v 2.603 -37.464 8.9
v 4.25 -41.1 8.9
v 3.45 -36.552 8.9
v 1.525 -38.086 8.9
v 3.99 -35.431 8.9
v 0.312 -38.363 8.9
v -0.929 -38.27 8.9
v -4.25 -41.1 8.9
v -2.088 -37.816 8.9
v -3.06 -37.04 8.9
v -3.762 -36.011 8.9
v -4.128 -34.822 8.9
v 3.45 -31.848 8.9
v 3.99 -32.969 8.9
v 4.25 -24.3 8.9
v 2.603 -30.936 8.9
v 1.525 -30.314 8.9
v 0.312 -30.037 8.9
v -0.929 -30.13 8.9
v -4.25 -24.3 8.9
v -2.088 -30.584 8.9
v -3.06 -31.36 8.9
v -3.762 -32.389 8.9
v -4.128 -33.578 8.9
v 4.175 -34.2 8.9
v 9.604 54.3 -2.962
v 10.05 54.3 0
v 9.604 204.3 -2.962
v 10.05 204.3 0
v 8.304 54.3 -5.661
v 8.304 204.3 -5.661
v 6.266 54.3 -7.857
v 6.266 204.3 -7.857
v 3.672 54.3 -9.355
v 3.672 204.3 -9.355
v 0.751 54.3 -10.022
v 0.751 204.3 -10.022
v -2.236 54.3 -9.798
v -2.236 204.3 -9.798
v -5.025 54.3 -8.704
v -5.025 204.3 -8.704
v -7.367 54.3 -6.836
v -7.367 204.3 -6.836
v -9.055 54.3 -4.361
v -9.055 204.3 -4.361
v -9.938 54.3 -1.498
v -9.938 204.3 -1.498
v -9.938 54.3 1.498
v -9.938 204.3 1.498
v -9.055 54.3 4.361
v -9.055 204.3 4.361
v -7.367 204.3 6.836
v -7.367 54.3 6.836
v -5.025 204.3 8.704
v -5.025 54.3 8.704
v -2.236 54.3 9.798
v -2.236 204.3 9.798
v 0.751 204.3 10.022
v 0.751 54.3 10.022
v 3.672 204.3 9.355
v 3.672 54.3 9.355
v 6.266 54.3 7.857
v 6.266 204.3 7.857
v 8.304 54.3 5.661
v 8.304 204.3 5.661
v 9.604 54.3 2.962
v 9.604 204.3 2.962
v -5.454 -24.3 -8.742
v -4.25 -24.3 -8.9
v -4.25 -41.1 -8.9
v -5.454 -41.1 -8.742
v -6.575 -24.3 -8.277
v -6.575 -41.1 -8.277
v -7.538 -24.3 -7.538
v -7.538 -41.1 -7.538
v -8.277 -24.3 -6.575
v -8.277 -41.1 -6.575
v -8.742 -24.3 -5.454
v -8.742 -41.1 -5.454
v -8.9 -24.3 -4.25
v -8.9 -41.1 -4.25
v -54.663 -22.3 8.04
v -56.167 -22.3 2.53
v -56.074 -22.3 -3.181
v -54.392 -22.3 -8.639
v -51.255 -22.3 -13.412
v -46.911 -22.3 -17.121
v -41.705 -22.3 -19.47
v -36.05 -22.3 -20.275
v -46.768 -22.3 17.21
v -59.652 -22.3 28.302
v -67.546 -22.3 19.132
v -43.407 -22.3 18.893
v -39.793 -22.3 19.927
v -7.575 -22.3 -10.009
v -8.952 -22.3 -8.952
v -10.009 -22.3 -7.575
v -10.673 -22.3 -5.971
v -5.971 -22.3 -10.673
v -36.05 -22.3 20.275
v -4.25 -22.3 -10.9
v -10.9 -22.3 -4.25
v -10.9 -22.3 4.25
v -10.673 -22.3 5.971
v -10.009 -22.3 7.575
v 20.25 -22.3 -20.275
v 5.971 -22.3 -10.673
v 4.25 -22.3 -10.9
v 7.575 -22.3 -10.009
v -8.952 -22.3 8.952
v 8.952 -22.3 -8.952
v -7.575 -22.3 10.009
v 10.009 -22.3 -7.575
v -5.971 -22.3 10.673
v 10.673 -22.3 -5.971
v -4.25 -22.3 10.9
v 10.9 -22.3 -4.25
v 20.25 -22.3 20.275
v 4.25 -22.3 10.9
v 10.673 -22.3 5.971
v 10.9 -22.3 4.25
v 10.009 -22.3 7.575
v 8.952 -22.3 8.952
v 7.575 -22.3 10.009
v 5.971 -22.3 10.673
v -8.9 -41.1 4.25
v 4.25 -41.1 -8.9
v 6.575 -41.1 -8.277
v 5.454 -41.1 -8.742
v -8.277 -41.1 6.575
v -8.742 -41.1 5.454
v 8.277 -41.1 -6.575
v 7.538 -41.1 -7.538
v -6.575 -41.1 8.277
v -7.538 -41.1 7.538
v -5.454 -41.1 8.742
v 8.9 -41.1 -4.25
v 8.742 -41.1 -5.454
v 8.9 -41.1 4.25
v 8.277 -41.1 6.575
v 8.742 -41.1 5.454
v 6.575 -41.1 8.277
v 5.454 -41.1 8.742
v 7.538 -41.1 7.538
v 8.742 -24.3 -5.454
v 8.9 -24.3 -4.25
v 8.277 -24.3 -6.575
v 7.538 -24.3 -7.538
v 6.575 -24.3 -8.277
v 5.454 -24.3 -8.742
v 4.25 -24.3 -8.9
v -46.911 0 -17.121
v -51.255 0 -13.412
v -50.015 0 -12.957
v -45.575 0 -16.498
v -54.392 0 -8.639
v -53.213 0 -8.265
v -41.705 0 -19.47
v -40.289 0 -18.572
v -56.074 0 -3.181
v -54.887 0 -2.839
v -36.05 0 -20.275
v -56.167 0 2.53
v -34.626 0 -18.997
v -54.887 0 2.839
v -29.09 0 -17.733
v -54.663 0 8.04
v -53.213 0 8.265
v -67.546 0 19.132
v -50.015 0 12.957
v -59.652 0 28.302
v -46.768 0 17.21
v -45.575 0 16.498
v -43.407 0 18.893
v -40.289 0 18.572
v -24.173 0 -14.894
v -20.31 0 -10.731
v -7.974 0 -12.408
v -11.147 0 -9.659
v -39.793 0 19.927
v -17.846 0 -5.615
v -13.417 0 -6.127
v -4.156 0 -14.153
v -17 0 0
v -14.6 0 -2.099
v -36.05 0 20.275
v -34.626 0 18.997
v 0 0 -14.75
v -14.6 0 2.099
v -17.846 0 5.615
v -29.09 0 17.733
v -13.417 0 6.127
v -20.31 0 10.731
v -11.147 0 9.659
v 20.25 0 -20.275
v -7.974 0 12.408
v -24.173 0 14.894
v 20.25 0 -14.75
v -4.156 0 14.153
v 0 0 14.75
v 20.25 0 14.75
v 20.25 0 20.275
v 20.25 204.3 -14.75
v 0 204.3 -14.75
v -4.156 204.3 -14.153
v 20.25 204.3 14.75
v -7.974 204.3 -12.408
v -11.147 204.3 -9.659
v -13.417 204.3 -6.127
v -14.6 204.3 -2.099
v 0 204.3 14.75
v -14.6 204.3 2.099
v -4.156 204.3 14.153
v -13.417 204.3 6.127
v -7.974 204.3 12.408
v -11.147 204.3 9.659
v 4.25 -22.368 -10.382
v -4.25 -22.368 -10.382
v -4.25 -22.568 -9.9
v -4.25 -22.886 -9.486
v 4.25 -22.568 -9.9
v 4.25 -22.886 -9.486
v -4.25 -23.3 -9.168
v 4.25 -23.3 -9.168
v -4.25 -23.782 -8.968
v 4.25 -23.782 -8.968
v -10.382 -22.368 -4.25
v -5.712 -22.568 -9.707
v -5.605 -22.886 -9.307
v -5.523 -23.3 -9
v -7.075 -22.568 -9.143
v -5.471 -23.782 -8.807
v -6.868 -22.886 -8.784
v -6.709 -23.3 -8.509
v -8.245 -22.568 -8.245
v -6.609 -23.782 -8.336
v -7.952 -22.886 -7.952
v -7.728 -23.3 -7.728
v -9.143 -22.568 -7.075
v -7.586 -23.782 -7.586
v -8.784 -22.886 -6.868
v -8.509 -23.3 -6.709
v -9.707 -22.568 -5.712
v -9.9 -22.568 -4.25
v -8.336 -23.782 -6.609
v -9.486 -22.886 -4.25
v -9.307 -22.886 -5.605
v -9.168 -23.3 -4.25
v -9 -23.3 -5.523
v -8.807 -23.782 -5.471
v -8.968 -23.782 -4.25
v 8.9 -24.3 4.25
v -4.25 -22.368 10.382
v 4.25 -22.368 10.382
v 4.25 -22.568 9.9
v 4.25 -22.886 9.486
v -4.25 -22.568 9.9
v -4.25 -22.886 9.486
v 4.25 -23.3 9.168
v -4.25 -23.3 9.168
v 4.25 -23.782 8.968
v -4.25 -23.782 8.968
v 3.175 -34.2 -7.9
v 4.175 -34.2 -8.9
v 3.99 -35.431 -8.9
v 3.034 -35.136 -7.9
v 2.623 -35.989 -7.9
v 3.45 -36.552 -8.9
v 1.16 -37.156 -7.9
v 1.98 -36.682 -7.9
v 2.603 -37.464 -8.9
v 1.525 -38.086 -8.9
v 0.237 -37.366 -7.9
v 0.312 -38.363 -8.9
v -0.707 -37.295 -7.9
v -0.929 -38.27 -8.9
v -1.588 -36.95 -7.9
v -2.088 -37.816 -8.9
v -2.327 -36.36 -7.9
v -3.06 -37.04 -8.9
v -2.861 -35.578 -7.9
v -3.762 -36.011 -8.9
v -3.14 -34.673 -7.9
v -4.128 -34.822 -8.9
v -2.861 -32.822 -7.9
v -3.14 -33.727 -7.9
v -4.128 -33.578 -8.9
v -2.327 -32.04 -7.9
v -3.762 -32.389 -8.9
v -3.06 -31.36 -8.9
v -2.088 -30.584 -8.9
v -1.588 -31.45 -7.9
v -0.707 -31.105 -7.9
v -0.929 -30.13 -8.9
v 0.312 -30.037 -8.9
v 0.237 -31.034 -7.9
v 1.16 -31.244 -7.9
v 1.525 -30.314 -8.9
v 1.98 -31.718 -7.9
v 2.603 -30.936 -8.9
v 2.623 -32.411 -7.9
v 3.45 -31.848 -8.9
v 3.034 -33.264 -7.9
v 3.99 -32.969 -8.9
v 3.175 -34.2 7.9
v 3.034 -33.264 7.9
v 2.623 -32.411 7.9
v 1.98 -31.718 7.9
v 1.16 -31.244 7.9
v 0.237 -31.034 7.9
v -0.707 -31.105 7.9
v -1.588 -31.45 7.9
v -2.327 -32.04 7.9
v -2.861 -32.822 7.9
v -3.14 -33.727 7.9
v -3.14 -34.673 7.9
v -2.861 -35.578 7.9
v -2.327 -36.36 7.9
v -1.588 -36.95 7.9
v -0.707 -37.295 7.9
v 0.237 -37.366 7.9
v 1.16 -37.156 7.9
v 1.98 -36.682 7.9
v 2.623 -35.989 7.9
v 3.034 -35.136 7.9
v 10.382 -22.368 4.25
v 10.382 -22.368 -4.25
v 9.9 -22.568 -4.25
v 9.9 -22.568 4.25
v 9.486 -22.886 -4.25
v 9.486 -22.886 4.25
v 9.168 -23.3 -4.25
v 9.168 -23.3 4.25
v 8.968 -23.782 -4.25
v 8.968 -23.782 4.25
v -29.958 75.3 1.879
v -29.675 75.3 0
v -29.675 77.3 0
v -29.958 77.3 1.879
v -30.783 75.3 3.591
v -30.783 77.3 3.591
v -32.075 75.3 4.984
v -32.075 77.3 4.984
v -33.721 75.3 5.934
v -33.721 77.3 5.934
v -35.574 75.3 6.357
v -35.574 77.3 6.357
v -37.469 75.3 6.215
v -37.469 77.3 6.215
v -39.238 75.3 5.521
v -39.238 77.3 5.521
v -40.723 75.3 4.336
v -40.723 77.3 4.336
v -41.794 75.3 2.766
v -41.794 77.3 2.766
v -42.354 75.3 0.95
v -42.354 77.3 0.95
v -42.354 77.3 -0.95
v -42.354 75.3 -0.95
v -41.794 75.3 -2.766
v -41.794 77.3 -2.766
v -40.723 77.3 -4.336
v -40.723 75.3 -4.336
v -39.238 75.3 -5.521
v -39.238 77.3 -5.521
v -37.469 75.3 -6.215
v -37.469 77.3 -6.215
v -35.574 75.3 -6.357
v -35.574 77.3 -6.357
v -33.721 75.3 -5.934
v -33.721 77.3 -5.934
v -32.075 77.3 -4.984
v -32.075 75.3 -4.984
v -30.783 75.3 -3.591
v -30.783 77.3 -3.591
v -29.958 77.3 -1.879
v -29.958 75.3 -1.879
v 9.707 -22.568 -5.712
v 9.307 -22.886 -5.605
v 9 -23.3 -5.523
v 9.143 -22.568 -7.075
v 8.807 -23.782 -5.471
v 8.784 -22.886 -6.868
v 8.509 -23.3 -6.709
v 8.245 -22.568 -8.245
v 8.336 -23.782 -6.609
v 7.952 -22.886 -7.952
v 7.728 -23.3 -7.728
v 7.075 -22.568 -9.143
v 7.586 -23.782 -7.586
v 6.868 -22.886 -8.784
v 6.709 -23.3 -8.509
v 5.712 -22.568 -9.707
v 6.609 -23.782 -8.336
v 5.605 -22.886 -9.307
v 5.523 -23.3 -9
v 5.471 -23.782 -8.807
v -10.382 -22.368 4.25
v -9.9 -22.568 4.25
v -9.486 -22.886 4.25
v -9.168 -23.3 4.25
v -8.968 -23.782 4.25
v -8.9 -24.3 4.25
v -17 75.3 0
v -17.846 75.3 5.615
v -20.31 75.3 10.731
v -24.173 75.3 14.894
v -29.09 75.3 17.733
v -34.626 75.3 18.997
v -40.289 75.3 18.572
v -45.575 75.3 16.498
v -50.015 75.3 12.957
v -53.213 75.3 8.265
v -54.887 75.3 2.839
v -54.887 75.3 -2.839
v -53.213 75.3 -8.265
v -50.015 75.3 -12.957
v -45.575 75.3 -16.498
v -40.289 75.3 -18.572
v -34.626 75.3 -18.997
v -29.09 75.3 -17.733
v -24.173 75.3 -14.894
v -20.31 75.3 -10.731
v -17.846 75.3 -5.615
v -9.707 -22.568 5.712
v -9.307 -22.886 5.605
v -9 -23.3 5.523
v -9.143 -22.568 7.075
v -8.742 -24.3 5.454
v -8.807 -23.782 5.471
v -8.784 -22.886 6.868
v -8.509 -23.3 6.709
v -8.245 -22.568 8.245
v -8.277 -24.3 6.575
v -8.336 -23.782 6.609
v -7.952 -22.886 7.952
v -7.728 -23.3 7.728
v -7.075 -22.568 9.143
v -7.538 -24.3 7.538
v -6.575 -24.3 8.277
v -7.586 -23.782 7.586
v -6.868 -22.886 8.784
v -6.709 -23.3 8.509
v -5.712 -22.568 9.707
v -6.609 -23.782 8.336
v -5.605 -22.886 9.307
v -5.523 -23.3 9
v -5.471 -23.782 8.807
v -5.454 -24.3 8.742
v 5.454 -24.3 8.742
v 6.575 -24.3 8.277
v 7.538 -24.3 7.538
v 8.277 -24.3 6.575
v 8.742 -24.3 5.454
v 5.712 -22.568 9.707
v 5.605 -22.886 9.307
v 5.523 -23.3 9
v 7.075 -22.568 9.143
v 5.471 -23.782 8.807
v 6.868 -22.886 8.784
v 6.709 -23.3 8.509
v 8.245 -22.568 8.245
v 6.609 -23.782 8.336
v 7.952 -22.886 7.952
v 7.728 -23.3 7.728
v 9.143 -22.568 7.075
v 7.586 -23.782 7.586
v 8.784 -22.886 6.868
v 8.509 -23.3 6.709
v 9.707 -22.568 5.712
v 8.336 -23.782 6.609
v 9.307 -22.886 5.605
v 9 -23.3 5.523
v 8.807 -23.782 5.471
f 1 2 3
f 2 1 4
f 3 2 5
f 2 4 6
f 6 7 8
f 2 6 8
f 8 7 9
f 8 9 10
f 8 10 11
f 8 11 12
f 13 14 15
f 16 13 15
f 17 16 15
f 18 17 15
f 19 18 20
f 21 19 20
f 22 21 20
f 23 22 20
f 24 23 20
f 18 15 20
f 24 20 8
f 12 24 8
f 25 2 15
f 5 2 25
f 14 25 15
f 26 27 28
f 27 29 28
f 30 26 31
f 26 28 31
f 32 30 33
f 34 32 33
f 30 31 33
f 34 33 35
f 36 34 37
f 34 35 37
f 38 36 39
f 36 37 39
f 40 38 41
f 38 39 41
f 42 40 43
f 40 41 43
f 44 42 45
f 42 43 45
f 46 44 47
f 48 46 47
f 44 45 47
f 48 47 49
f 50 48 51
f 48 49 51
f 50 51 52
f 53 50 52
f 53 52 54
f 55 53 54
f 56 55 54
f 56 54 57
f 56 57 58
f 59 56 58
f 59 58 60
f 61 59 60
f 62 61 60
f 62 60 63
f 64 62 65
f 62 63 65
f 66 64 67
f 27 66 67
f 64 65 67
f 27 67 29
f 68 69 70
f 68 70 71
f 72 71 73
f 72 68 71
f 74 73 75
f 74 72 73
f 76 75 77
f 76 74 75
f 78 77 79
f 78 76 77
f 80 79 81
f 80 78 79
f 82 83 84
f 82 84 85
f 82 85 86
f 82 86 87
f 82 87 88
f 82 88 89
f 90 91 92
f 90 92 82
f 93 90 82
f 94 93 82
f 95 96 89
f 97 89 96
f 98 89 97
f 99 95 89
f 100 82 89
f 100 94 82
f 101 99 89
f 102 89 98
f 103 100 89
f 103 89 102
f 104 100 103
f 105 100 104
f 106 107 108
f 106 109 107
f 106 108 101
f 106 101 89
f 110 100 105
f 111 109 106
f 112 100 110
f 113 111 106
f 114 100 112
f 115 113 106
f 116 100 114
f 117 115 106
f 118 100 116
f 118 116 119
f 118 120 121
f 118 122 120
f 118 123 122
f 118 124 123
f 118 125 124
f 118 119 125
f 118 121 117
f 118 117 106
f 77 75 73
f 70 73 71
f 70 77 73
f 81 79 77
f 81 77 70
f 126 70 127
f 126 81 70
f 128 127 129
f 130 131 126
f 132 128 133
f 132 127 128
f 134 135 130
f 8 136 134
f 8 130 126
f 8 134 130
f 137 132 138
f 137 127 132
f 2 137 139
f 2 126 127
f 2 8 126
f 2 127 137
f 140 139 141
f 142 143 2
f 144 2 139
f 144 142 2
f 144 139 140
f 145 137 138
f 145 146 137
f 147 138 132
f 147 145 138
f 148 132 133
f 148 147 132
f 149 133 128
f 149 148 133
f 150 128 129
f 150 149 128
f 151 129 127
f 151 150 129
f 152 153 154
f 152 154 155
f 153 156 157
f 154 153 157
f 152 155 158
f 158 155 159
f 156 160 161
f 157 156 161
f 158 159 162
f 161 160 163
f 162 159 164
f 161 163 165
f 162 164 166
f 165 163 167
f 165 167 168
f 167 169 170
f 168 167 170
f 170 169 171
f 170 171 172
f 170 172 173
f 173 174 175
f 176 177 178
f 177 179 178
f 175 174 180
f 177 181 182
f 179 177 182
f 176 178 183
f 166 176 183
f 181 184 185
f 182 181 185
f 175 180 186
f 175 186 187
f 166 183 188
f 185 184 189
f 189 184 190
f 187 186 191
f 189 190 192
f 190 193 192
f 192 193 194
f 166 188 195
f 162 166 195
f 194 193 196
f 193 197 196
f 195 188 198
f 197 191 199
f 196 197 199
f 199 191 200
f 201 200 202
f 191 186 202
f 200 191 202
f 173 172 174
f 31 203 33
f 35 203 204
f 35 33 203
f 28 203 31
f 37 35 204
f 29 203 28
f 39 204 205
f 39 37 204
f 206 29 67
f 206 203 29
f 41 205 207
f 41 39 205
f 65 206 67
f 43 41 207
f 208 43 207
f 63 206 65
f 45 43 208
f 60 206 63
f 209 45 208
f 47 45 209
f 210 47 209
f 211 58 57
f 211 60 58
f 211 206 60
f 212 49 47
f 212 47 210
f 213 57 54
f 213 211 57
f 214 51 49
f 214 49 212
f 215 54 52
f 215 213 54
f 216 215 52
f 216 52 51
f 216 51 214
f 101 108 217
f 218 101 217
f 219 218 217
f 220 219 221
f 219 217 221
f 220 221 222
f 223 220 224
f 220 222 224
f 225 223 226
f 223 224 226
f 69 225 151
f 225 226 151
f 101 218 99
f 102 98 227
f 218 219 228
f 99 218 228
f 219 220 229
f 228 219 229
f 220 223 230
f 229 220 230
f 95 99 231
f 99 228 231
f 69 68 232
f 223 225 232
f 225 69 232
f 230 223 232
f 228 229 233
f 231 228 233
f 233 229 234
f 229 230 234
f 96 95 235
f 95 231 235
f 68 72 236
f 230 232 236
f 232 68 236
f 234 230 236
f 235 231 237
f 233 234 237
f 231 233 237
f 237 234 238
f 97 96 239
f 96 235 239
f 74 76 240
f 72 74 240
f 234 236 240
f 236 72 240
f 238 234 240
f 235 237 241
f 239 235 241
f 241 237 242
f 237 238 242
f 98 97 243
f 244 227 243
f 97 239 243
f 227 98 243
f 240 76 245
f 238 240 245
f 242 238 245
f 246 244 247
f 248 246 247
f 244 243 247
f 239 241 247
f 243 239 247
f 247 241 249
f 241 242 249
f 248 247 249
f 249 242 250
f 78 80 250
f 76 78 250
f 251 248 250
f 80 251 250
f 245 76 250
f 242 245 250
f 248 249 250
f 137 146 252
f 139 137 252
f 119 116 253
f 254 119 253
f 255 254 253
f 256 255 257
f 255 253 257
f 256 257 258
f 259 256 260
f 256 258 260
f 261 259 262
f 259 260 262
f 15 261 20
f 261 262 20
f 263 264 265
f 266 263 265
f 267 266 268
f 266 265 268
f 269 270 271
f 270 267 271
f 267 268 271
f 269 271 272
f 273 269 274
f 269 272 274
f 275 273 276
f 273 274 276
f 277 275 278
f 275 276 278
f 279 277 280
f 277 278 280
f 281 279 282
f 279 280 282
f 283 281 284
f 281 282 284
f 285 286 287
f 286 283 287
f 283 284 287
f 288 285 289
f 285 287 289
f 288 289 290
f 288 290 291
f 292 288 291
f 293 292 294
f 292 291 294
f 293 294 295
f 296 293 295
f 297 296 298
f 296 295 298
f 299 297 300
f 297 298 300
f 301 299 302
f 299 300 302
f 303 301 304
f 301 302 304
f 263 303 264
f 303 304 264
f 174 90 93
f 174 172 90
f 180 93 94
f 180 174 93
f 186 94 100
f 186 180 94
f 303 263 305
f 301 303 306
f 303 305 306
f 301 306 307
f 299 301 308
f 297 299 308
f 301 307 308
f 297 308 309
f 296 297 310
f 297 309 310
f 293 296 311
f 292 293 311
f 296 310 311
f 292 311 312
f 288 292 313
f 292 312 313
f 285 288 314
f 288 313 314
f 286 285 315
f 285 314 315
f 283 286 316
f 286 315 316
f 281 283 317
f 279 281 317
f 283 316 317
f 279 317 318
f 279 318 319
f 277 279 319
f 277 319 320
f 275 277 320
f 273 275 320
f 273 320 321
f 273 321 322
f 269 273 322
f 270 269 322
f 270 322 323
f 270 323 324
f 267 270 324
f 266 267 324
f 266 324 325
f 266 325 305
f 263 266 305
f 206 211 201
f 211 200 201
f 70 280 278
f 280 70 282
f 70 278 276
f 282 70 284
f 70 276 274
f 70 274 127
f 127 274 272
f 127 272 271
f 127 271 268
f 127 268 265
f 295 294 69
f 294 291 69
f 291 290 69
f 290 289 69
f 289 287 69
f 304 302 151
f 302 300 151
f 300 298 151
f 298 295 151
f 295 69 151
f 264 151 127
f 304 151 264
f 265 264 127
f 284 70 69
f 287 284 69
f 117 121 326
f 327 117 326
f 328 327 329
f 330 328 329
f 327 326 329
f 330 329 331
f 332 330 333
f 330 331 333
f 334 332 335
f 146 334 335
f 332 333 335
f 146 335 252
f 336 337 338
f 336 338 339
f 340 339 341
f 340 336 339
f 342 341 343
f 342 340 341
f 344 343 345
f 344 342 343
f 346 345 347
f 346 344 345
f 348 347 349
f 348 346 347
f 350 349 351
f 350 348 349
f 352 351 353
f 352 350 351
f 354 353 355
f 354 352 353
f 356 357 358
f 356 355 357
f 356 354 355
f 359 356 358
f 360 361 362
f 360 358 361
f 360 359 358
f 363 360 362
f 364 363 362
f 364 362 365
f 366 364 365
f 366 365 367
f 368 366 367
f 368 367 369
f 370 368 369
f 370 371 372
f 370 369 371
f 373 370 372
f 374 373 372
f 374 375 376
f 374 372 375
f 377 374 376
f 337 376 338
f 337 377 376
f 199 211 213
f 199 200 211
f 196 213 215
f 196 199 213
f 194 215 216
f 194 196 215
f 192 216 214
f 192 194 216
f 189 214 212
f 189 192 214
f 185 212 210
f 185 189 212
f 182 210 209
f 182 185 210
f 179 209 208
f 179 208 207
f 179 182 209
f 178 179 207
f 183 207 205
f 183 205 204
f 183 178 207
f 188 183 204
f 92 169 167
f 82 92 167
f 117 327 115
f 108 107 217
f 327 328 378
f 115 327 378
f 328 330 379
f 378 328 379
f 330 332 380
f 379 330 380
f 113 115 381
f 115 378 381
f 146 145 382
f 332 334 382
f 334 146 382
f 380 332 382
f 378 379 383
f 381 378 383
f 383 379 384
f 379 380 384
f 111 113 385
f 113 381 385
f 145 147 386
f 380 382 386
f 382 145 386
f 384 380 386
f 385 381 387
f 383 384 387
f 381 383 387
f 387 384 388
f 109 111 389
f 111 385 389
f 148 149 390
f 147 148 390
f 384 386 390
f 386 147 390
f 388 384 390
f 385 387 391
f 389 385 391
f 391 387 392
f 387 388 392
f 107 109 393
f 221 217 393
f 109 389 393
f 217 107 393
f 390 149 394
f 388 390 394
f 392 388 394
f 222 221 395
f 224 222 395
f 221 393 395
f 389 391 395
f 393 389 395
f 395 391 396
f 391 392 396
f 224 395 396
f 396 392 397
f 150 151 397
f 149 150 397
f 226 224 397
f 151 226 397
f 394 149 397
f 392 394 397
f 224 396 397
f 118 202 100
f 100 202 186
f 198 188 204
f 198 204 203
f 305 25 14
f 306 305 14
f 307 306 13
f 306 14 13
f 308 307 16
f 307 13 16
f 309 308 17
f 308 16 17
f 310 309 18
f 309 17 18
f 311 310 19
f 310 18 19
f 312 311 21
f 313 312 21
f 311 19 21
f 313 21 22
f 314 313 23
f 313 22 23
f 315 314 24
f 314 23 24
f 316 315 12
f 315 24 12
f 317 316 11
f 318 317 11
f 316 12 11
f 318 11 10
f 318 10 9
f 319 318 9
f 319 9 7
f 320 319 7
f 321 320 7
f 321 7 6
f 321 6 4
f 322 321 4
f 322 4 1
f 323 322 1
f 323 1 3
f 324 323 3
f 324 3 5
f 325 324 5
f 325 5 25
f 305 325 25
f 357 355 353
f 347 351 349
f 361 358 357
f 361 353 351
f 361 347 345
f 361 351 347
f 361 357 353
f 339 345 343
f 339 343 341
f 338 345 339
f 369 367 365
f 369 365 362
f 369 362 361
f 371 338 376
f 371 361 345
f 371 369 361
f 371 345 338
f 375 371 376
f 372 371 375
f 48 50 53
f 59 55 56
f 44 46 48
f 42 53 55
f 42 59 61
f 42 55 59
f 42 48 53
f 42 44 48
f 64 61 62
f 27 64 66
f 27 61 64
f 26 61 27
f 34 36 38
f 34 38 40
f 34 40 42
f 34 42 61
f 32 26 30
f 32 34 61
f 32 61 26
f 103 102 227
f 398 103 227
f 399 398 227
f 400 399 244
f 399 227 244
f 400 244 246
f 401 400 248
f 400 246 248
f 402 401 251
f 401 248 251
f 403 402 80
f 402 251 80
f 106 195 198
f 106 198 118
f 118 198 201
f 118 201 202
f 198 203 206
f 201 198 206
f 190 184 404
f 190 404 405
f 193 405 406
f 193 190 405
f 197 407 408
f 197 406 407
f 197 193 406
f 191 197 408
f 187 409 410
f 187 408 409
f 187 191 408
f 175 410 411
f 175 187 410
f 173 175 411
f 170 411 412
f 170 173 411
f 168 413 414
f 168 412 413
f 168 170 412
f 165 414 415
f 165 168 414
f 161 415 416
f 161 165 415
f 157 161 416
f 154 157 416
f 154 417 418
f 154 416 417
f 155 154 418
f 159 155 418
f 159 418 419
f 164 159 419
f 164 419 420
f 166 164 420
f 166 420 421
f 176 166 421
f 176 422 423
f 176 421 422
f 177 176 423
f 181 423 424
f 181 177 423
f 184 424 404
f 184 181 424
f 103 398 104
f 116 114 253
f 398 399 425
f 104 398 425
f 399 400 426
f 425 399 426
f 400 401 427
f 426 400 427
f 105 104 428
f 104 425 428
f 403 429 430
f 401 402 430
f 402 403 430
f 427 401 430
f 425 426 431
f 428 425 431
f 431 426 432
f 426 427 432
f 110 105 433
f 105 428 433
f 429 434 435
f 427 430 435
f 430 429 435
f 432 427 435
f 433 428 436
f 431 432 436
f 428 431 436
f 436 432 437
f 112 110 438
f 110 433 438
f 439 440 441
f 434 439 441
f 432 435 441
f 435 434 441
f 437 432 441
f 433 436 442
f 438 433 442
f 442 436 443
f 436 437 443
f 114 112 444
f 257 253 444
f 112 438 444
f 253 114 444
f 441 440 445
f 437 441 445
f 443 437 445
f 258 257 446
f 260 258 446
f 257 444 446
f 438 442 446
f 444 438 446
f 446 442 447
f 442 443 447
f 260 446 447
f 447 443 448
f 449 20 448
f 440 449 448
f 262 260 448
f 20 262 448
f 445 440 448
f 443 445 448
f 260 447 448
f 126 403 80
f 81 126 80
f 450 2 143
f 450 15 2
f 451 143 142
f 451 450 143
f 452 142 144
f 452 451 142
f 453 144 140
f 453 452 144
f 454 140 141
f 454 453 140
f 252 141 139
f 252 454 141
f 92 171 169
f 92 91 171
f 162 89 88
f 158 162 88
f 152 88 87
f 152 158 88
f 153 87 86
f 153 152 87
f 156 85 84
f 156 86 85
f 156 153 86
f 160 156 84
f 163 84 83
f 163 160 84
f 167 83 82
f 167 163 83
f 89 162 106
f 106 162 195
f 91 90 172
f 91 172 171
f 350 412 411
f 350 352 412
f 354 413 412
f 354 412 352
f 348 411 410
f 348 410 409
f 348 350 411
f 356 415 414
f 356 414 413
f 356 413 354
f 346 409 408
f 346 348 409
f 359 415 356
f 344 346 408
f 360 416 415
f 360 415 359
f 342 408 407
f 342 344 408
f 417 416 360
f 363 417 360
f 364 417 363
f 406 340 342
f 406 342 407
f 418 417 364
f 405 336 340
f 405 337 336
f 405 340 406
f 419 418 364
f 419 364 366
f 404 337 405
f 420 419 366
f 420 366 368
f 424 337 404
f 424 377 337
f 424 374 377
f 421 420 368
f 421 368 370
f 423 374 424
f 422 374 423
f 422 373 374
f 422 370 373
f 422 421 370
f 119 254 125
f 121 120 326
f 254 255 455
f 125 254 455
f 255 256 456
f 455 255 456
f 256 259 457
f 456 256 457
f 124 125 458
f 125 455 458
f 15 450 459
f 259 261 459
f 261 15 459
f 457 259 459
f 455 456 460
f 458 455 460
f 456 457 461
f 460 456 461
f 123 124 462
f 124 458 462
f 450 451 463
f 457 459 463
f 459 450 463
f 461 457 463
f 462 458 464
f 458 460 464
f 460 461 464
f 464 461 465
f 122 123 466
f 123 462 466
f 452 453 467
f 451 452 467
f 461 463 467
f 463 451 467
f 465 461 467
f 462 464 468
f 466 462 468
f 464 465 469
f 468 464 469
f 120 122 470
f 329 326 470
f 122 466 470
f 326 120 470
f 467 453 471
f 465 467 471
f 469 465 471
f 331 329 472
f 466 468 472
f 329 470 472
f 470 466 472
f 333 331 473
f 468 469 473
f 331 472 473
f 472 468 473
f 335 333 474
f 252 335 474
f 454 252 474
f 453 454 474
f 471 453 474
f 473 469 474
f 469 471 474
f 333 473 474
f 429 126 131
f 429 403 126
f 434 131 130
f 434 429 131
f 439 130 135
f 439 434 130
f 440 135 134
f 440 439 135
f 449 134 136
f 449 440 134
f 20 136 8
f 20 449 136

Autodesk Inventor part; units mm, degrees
ref_plane "YZ Plane" through (0, 0, 0) normal (1, 0, 0) x (0, 1, 0)
ref_plane "XZ Plane" through (0, 0, 0) normal (0, 1, 0) x (-1, 0, 0)
ref_plane "XY Plane" through (0, 0, 0) normal (0, 0, 1) x (1, 0, 0)
sketch "Sketch1" plane through (0, 0, 0) normal (0, 1, 0) x (-1, 0, 0)
  circle A0 centre (0, 0) radius 14.75
  line L0 (-20.25, 14.75) -> (-20.25, -14.75)
  line L1 (0, 14.75) -> (-20.25, 14.75)
  line L2 (0, -14.75) -> (-20.25, -14.75)
  point P0 (14.75, 0)
  dimension "d0" = 29.5
  dimension "d1" = 35
extrude "Extrusion1" add sketch "Sketch1" along normal blind 204.3
sketch "Sketch2" plane through (0, 0, 0) normal (0, -1, 0) x (1, 0, 0)
  line L0 (20.25, 20.275) -> (-36.05, 20.275)
  line L1 (-55.3, 6.365) -> (-55.3, 0) construction
  line L2 (-36.05, -20.275) -> (20.25, -20.275)
  line L3 (20.25, -20.275) -> (20.25, 20.275)
  line L4 (20.25, 14.75) -> (20.25, -14.75) projected
  line L5 (0, 0) -> (18.4964, 0) construction
  circle A0 centre (-36.05, 0) radius 19.25 construction
  arc A1 (-36.05, 20.275) -> (-36.05, -20.275) centre (-36.05, 0) ccw
  dimension "d6" = 38.5
  dimension "d4" = 40.55
  dimension "d5" = 75.55
extrude "Extrusion2" add sketch "Sketch2" along normal blind 22.3
sketch "Sketch3" plane through (0, 204.3, 0) normal (0, 1, 0) x (1, 0, 0)
  arc A0 (0, 14.75) -> (0, -14.75) centre (0, 0) ccw projected
  circle A1 centre (0, 0) radius 10.05
  dimension "d9" = 20.1
extrude "Extrusion3" cut sketch "Sketch3" against normal blind 150
sketch "Sketch4" plane through (0, 0, 0) normal (0, 1, 0) x (1, 0, 0)
  circle A0 centre (-36.05, 0) radius 19.05
  arc A1 (-36.05, 20.275) -> (-36.05, -20.275) centre (-36.05, 0) ccw projected
  point P0 (0, 0)
  dimension "d12" = 38.1
extrude "Extrusion4" add sketch "Sketch4" along normal blind 75.3
sketch "Sketch5" plane through (-36.05, 75.3, 0) normal (0, 1, 0) x (1, 0, 0)
  circle A0 centre (0, 0) radius 6.375
  circle A1 centre (0, 0) radius 19.05 projected
  point P0 (36.05, 0)
  dimension "d15" = 12.75
extrude "Extrusion5" add sketch "Sketch5" along normal blind 2 contours A0
sketch "Sketch6" plane through (0, -22.3, 0) normal (0, -1, 0) x (1, 0, 0)
  circle A0 centre (0, 0) radius 10.05 construction
  line L0 (-8.9, -8.9) -> (8.9, -8.9)
  line L1 (8.9, -8.9) -> (8.9, 8.9)
  line L2 (8.9, 8.9) -> (-8.9, 8.9)
  line L3 (-8.9, 8.9) -> (-8.9, -8.9)
  line L4 (-8.9, -8.9) -> (8.9, 8.9) construction
  line L5 (8.9, -8.9) -> (-8.9, 8.9) construction
  arc A1 (-4.25, 8.9) -> (-8.9, 4.25) centre (-4.25, 4.25) ccw
  arc A2 (-8.9, -4.25) -> (-4.25, -8.9) centre (-4.25, -4.25) ccw
  arc A3 (4.25, -8.9) -> (8.9, -4.25) centre (4.25, -4.25) ccw
  arc A4 (8.9, 4.25) -> (4.25, 8.9) centre (4.25, 4.25) ccw
  point P0 (4.25, 8.9)
  point P1 (-4.25, -8.9)
  point P2 (8.9, -4.25)
  dimension "d18" = 17.8
  dimension "d19" = 17.8
  dimension "d22" = 360
  dimension "d24" = 8.5
extrude "Extrusion6" add sketch "Sketch6" along normal blind 18.8 contours A2 L3 A1 L2 A4 L1 A3 L0
fillet "Fillet1" radius 2 8 edges at (7.538, -22.3, 7.538) (8.9, -22.3, 0) (7.538, -22.3, -7.538) (0, -22.3, -8.9) (-7.538, -22.3, -7.538) (-8.9, -22.3, 0) (-7.538, -22.3, 7.538) (0, -22.3, 8.9)
sketch "Sketch7" plane through (-4.25, -41.1, 8.9) normal (0, 0, 1) x (1, 0, 0)
  circle A0 centre (4.25, 6.9) radius 3.175
  line L0 (8.5, 0) -> (0, 0) projected
  point P0 (4.25, 41.1)
  point P1 (4.25, 0)
  dimension "d28" = 6.9
  dimension "d29" = 6.35
extrude "Extrusion7" cut sketch "Sketch7" against normal through all
chamfer "Chamfer1" distance 1 angle 45 2 edges at (-3.175, -34.2, 8.9) (-3.175, -34.2, -8.9)
sketch "Sketch8" plane through (0, -22.3, 0) normal (0, -1, 0) x (1, 0, 0)
  line L0 (-50.7155, 14) -> (-50.7155, -14) construction
  arc A0 (-36.05, 20.275) -> (-36.05, -20.275) centre (-36.05, 0) ccw construction
  line L1 (-54.6626, 8.0403) -> (-46.7683, 17.2103)
  line L2 (-46.7683, 17.2103) -> (-59.6518, 28.3015)
  line L3 (-59.6518, 28.3015) -> (-67.5461, 19.1315)
  line L4 (-67.5461, 19.1315) -> (-54.6626, 8.0403)
  point P0 (0, 0)
  point P1 (-50.7155, 12.6253)
  dimension "d35" = 28
  dimension "d36" = 17
  dimension "d37" = 12.1
extrude "Extrusion8" add sketch "Sketch8" against normal up to surface (22.3 mm away)
properties part number "linear actuator"
